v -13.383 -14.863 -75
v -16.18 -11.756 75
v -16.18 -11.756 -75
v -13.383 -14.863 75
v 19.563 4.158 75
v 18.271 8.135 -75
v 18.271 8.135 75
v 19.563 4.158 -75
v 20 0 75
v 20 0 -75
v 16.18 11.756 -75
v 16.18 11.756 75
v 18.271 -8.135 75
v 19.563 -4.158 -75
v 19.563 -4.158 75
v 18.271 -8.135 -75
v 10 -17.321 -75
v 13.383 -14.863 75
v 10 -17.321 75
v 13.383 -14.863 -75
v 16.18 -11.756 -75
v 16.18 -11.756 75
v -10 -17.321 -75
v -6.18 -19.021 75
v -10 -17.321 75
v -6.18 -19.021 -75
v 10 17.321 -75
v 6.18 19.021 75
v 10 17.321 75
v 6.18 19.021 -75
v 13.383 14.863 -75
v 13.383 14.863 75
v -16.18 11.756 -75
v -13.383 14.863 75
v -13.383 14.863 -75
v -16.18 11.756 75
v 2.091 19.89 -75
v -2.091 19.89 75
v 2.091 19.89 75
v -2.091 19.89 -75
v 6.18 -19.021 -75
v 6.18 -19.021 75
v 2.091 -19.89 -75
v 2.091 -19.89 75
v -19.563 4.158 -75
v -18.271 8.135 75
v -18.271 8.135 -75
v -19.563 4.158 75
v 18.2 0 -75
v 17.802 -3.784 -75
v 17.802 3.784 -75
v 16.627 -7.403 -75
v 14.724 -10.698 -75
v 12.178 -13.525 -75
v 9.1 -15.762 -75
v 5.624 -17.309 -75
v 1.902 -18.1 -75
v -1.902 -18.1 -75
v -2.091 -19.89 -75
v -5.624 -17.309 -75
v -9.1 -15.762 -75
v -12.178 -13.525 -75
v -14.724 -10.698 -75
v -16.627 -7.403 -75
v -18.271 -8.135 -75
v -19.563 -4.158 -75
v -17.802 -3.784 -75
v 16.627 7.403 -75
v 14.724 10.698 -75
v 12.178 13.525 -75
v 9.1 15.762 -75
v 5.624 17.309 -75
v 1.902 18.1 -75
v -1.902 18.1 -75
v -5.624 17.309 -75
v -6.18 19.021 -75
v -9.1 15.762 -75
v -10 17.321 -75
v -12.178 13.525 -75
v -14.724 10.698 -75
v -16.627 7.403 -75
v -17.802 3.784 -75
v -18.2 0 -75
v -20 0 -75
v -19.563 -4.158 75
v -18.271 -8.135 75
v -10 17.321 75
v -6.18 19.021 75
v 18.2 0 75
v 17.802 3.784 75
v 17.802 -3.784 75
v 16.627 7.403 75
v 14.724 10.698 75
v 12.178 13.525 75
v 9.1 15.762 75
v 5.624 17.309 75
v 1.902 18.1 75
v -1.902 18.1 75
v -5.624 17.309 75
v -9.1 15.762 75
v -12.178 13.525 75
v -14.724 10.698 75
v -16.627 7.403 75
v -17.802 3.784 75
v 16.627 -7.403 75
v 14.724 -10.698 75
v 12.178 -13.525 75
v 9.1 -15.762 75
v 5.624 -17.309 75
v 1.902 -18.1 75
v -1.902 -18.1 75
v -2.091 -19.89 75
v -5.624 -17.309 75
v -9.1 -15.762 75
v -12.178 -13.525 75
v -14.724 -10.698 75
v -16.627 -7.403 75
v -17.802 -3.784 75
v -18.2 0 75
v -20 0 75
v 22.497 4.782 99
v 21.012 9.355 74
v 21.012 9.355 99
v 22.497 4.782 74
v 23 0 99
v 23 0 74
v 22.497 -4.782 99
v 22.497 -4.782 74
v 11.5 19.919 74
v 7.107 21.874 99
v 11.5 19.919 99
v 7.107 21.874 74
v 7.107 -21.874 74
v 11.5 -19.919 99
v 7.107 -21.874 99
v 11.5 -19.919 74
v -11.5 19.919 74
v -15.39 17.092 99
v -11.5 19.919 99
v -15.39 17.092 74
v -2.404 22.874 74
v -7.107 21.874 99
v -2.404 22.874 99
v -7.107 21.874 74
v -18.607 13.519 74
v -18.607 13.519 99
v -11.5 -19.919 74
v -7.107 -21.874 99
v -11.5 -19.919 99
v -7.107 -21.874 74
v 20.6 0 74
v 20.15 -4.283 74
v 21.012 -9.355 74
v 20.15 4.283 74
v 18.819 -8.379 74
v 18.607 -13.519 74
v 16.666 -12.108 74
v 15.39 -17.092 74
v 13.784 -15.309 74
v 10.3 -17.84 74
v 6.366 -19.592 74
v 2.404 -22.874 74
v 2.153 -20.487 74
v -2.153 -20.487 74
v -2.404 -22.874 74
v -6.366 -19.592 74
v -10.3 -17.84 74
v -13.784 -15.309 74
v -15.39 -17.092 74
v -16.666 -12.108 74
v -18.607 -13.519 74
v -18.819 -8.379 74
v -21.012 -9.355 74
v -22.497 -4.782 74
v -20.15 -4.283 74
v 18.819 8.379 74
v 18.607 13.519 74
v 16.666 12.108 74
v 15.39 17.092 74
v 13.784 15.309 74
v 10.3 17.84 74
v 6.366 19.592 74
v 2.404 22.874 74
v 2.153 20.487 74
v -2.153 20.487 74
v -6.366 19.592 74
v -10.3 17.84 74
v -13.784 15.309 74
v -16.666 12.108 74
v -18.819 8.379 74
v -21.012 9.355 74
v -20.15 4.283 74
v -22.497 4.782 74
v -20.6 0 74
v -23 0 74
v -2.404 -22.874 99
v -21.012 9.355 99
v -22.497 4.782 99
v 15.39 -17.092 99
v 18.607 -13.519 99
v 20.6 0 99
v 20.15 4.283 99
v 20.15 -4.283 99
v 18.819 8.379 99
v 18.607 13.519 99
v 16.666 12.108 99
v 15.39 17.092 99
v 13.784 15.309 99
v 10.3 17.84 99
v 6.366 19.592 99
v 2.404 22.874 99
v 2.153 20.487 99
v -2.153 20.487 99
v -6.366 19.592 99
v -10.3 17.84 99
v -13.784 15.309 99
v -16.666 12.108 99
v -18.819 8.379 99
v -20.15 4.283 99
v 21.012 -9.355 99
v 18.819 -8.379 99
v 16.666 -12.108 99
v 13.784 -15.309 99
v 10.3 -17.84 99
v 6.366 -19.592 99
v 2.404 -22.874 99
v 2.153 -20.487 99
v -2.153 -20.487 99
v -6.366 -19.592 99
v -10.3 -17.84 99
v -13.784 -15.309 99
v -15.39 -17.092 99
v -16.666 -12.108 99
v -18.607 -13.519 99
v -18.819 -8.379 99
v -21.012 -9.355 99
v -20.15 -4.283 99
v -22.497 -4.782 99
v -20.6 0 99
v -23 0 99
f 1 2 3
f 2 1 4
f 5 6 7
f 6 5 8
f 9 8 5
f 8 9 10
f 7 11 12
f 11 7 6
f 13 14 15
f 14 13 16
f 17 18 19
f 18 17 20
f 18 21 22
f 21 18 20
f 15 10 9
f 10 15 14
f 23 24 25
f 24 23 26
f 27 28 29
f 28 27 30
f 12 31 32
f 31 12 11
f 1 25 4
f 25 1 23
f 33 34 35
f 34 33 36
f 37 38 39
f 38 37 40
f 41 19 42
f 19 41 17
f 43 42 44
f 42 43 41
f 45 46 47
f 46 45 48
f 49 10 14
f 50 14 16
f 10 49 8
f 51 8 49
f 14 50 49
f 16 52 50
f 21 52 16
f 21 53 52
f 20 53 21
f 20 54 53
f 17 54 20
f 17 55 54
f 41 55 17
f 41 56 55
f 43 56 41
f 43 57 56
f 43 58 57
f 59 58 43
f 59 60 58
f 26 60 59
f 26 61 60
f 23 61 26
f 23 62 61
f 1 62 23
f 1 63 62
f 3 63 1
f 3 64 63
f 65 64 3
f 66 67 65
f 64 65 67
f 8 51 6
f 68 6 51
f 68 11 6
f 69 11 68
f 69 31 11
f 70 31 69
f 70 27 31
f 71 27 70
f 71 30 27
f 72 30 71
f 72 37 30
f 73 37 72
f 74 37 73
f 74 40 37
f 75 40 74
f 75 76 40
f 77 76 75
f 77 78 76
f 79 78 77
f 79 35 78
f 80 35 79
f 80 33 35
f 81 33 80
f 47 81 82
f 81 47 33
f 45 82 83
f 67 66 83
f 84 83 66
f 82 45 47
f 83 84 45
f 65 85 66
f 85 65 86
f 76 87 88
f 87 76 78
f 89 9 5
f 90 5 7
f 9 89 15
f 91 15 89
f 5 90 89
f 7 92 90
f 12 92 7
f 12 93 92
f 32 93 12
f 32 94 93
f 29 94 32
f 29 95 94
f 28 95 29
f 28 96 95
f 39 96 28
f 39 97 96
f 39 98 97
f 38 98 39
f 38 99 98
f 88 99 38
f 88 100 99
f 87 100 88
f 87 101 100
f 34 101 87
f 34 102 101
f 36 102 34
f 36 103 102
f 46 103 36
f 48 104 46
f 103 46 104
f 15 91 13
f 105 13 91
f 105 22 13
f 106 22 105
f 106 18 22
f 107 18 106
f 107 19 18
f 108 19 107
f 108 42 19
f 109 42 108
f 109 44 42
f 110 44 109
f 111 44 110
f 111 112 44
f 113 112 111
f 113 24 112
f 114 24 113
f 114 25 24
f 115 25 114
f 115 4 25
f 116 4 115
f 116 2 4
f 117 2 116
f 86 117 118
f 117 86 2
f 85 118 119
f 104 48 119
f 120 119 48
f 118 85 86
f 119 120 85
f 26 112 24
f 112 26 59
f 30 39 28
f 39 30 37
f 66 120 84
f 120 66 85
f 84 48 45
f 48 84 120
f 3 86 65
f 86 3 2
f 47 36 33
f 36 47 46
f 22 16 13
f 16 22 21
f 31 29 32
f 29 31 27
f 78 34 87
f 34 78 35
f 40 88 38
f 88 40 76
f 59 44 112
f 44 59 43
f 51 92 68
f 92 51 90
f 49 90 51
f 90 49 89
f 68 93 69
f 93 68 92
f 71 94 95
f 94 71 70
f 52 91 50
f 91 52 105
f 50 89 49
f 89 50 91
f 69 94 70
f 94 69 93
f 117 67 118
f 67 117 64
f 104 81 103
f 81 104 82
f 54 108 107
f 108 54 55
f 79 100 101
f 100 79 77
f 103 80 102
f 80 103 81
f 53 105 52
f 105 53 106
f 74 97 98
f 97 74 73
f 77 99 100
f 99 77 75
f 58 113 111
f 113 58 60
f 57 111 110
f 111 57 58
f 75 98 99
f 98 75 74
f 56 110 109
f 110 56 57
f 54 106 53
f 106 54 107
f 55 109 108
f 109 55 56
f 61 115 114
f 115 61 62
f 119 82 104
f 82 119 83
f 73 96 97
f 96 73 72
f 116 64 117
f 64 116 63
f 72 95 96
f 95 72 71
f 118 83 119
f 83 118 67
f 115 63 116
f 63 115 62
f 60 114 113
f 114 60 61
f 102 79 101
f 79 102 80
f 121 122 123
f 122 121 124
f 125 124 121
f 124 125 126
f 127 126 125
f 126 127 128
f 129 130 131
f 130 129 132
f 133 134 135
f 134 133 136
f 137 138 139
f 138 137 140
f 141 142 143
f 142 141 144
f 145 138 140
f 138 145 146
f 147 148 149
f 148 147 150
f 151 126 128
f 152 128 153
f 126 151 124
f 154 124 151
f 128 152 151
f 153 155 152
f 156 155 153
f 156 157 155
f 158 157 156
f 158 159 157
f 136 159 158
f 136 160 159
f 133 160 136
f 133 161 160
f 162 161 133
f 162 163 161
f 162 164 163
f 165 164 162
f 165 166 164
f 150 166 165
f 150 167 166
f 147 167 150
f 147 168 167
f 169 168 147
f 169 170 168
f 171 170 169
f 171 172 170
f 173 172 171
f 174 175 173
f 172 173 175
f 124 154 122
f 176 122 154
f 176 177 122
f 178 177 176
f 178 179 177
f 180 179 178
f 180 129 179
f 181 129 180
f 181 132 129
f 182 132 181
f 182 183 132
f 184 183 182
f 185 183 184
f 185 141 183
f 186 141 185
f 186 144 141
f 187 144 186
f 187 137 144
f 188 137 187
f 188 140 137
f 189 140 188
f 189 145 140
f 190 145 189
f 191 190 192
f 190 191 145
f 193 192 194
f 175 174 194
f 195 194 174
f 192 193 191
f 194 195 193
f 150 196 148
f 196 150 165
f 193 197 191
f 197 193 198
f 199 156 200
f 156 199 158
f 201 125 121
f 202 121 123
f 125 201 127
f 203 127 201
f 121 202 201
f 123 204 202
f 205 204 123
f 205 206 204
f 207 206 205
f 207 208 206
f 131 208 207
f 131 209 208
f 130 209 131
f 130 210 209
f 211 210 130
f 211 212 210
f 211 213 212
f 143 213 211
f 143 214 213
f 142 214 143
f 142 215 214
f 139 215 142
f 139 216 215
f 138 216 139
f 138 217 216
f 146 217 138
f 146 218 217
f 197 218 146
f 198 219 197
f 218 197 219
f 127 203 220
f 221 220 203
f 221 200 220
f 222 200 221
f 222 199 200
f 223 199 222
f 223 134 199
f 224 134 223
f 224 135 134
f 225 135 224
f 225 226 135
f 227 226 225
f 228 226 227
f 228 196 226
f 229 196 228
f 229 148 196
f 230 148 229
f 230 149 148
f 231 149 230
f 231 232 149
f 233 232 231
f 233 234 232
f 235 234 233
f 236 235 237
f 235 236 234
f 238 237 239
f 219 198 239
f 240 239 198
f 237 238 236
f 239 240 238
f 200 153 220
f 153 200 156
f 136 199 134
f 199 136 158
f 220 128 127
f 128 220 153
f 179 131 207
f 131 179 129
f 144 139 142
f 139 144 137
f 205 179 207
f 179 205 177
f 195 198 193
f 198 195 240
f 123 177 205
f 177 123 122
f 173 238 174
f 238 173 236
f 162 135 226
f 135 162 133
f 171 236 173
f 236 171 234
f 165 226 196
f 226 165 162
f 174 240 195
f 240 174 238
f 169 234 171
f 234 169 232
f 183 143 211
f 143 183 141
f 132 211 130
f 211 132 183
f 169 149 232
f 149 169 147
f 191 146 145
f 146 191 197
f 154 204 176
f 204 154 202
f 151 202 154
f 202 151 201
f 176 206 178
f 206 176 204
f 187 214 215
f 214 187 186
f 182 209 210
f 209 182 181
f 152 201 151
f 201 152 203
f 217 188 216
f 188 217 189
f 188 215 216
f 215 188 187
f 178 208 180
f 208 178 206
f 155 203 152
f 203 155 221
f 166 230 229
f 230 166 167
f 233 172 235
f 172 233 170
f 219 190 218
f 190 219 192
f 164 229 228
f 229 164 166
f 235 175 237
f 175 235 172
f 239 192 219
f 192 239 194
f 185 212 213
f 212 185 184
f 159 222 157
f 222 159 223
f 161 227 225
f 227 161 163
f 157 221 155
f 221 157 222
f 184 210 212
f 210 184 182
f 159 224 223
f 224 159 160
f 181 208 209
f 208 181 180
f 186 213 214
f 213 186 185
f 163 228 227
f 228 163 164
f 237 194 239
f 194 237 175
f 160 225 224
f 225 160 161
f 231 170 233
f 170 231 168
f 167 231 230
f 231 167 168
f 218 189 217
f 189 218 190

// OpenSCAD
// Parameters
pipe_standard = 1; //[1:1:1]
nominal_diameter = 40; //[20:80:1]
length_mm = 150; //[75:300:1]
include_end_fitting = 1; //[0:1:1]
ht40_outer_diameter = 40; //[30:60:0.5]
ht40_wall_thickness = 1.8; //[1:4:0.1]
overlap_mm = 1; //[0.5:2:0.1]
fitting_length = 25; //[12:50:1]
fitting_od_extra = 6; //[2:15:0.5]
socket_clearance = 0.6; //[0.2:1.5:0.1]

// HT Pipe - complete geometry
module ht_pipe() {
  color([0.85, 0.85, 0.8]) {
    // Pipe segment
    difference() {
      cylinder(h=length_mm, r=ht40_outer_diameter/2, center=true);
      translate([0, 0, 0])
        cylinder(h=length_mm + 2*overlap_mm, r=ht40_outer_diameter/2 - ht40_wall_thickness, center=true);
    }
    
    // End fitting
    if (include_end_fitting) {
      translate([0, 0, length_mm/2 + fitting_length/2 - overlap_mm]) {
        difference() {
          cylinder(h=fitting_length, r=ht40_outer_diameter/2 + fitting_od_extra/2, center=true);
          translate([0, 0, 0])
            cylinder(h=fitting_length + 2*overlap_mm, r=ht40_outer_diameter/2 + socket_clearance, center=true);
        }
      }
    }
  }
}

// Assembly
module assembly() {
  ht_pipe();
}

assembly();
